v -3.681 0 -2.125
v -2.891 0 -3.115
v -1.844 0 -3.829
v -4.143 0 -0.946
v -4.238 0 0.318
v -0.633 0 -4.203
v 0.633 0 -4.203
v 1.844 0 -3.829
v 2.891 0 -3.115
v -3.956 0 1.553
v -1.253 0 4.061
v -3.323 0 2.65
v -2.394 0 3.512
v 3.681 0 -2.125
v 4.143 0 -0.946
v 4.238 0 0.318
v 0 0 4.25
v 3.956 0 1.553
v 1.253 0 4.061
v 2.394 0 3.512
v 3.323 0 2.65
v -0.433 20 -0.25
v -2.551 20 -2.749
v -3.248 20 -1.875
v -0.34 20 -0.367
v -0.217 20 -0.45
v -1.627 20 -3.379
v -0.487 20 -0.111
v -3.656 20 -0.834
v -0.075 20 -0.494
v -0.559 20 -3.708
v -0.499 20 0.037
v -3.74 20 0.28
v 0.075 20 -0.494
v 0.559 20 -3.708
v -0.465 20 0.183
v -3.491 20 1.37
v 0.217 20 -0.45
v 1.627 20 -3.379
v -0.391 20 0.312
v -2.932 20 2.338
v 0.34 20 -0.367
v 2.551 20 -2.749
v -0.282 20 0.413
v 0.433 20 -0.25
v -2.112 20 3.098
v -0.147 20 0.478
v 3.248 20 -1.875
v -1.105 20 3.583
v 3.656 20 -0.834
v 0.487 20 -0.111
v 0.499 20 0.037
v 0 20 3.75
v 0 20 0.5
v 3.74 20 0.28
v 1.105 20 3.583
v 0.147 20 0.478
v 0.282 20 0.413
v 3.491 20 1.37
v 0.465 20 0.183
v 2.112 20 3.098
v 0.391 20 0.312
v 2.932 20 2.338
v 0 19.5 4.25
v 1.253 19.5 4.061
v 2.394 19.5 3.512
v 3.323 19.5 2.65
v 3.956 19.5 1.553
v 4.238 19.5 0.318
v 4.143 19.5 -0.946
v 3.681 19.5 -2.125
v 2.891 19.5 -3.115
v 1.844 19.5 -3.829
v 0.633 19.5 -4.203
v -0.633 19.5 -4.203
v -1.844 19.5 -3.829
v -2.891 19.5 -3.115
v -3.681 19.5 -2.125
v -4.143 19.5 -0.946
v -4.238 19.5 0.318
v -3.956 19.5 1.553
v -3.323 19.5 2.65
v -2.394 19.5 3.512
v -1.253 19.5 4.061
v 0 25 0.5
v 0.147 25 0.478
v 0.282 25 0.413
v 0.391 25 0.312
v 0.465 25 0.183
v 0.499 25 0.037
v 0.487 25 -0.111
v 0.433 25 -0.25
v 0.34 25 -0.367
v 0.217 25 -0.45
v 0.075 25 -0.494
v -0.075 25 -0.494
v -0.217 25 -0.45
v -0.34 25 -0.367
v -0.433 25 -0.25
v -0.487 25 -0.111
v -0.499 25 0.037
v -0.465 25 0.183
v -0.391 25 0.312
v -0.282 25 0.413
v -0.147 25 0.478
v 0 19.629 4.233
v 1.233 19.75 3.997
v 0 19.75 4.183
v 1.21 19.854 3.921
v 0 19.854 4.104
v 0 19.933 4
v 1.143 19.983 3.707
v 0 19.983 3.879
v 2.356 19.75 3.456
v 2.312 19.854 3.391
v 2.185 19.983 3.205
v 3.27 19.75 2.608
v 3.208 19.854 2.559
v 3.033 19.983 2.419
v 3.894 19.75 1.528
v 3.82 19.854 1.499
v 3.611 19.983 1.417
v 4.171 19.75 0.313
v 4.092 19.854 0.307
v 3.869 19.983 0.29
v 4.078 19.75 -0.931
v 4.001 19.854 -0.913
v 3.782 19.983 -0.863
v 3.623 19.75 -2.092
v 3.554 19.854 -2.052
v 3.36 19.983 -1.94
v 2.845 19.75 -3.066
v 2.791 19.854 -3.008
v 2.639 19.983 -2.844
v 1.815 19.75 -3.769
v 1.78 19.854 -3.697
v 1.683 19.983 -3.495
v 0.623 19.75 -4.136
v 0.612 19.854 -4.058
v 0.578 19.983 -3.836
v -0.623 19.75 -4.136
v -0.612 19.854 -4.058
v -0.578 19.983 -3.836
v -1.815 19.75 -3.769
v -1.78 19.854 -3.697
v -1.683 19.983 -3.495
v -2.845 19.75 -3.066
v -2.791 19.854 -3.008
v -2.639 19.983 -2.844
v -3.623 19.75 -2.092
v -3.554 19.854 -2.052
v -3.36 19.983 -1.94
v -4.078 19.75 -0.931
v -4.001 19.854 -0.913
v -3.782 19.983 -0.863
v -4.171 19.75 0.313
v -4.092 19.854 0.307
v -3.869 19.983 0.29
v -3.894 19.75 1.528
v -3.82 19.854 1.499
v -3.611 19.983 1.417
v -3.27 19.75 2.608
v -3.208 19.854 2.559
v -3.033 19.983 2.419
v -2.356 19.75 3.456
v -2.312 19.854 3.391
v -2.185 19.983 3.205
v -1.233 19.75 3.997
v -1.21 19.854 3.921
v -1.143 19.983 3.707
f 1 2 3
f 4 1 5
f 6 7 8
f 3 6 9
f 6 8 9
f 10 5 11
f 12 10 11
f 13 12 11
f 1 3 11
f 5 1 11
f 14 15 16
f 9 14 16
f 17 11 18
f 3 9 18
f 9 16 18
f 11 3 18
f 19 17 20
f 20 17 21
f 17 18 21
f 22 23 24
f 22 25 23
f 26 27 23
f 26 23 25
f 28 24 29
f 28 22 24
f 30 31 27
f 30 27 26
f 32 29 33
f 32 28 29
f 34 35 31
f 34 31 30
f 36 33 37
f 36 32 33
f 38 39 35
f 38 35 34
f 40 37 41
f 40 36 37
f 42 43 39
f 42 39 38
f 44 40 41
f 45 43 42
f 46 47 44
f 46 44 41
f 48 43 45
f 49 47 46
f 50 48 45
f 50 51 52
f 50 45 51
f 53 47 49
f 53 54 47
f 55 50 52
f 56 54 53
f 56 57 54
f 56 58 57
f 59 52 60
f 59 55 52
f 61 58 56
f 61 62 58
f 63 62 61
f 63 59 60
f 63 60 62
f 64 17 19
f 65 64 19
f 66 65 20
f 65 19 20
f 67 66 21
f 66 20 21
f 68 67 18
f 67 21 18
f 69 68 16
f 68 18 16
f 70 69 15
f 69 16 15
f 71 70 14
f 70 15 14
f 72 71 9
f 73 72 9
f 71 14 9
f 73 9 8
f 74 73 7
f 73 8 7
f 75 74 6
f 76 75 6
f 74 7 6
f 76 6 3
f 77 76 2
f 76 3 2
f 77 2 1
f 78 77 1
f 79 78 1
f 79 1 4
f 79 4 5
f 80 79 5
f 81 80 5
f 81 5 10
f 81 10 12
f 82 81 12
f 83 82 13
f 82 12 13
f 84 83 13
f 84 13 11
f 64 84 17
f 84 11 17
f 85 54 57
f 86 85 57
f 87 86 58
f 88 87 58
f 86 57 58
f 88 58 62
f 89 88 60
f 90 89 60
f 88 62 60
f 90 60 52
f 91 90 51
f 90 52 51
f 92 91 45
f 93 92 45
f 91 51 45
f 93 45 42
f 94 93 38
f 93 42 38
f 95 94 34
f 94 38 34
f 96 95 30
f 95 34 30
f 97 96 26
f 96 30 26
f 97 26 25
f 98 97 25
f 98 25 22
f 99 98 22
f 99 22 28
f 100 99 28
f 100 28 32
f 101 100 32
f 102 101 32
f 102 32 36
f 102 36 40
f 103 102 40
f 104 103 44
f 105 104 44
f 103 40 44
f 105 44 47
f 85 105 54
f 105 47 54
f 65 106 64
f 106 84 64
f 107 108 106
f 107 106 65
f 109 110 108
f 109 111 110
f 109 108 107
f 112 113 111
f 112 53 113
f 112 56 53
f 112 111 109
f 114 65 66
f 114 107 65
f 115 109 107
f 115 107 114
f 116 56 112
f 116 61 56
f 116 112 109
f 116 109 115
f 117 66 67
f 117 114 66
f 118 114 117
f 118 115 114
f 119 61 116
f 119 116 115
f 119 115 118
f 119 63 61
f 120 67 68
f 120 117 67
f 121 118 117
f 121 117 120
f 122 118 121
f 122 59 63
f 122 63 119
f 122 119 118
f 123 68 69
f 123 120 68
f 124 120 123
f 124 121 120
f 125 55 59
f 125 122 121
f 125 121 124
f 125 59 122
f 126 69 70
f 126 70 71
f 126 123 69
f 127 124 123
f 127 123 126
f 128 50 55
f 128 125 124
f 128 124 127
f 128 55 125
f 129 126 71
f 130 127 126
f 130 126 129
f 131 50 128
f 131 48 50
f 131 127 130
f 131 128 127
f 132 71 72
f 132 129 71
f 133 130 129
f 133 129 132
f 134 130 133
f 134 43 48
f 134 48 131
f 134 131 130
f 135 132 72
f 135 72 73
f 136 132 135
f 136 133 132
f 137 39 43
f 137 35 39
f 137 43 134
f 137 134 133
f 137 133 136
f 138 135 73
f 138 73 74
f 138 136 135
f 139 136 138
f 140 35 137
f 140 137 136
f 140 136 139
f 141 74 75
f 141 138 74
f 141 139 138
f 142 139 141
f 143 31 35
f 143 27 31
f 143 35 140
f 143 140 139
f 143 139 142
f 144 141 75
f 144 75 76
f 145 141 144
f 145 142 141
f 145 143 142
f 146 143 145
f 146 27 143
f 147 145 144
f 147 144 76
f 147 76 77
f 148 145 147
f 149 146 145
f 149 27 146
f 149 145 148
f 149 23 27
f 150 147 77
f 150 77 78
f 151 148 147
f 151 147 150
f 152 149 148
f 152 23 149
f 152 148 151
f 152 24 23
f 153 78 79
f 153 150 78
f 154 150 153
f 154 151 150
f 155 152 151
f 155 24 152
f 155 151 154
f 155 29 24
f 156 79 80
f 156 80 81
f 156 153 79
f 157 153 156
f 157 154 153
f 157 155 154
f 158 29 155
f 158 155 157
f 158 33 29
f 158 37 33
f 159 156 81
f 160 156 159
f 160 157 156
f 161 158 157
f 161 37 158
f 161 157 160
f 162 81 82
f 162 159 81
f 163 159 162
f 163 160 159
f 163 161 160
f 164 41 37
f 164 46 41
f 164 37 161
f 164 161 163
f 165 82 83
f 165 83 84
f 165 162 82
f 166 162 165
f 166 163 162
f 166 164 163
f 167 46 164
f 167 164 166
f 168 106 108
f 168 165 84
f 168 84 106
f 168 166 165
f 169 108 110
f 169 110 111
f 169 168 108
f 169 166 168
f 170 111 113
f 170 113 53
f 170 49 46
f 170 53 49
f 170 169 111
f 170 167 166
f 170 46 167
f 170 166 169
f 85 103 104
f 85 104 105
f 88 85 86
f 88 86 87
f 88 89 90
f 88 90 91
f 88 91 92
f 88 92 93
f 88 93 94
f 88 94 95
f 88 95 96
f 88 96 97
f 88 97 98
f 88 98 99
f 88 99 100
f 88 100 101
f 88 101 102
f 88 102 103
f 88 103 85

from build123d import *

# Parameters (mm, degrees)
CROQUIS1_R              = 4.25
SALIENTE_EXTRUIR1_DEPTH = 20
REDONDEO1_R             = 0.5
CROQUIS2_R              = 0.5
SALIENTE_EXTRUIR2_DEPTH = 5


with BuildPart() as part:
    # Croquis1 → Saliente-Extruir1 (new body)
    with BuildSketch(Plane(origin=(0, 0, 0), x_dir=(1, 0, 0), z_dir=(0, 1, 0))):
        with Locations(Location((0, 0, 0), (0, 0, 270))):
            Circle(CROQUIS1_R)
    extrude(amount=SALIENTE_EXTRUIR1_DEPTH)

    # Redondeo1
    redondeo1_edges = [part.edges().sort_by_distance(p)[0] for p in [
        (0, 20, -4.25),
    ]]
    fillet(redondeo1_edges, radius=REDONDEO1_R)

    # Croquis2 → Saliente-Extruir2 (add)
    with BuildSketch(Plane(origin=(0, 20, 0), x_dir=(1, 0, 0), z_dir=(0, 1, 0))):
        with Locations(Location((0, 0, 0), (0, 0, 270))):
            Circle(CROQUIS2_R)
    extrude(amount=SALIENTE_EXTRUIR2_DEPTH)


solid = part.part
